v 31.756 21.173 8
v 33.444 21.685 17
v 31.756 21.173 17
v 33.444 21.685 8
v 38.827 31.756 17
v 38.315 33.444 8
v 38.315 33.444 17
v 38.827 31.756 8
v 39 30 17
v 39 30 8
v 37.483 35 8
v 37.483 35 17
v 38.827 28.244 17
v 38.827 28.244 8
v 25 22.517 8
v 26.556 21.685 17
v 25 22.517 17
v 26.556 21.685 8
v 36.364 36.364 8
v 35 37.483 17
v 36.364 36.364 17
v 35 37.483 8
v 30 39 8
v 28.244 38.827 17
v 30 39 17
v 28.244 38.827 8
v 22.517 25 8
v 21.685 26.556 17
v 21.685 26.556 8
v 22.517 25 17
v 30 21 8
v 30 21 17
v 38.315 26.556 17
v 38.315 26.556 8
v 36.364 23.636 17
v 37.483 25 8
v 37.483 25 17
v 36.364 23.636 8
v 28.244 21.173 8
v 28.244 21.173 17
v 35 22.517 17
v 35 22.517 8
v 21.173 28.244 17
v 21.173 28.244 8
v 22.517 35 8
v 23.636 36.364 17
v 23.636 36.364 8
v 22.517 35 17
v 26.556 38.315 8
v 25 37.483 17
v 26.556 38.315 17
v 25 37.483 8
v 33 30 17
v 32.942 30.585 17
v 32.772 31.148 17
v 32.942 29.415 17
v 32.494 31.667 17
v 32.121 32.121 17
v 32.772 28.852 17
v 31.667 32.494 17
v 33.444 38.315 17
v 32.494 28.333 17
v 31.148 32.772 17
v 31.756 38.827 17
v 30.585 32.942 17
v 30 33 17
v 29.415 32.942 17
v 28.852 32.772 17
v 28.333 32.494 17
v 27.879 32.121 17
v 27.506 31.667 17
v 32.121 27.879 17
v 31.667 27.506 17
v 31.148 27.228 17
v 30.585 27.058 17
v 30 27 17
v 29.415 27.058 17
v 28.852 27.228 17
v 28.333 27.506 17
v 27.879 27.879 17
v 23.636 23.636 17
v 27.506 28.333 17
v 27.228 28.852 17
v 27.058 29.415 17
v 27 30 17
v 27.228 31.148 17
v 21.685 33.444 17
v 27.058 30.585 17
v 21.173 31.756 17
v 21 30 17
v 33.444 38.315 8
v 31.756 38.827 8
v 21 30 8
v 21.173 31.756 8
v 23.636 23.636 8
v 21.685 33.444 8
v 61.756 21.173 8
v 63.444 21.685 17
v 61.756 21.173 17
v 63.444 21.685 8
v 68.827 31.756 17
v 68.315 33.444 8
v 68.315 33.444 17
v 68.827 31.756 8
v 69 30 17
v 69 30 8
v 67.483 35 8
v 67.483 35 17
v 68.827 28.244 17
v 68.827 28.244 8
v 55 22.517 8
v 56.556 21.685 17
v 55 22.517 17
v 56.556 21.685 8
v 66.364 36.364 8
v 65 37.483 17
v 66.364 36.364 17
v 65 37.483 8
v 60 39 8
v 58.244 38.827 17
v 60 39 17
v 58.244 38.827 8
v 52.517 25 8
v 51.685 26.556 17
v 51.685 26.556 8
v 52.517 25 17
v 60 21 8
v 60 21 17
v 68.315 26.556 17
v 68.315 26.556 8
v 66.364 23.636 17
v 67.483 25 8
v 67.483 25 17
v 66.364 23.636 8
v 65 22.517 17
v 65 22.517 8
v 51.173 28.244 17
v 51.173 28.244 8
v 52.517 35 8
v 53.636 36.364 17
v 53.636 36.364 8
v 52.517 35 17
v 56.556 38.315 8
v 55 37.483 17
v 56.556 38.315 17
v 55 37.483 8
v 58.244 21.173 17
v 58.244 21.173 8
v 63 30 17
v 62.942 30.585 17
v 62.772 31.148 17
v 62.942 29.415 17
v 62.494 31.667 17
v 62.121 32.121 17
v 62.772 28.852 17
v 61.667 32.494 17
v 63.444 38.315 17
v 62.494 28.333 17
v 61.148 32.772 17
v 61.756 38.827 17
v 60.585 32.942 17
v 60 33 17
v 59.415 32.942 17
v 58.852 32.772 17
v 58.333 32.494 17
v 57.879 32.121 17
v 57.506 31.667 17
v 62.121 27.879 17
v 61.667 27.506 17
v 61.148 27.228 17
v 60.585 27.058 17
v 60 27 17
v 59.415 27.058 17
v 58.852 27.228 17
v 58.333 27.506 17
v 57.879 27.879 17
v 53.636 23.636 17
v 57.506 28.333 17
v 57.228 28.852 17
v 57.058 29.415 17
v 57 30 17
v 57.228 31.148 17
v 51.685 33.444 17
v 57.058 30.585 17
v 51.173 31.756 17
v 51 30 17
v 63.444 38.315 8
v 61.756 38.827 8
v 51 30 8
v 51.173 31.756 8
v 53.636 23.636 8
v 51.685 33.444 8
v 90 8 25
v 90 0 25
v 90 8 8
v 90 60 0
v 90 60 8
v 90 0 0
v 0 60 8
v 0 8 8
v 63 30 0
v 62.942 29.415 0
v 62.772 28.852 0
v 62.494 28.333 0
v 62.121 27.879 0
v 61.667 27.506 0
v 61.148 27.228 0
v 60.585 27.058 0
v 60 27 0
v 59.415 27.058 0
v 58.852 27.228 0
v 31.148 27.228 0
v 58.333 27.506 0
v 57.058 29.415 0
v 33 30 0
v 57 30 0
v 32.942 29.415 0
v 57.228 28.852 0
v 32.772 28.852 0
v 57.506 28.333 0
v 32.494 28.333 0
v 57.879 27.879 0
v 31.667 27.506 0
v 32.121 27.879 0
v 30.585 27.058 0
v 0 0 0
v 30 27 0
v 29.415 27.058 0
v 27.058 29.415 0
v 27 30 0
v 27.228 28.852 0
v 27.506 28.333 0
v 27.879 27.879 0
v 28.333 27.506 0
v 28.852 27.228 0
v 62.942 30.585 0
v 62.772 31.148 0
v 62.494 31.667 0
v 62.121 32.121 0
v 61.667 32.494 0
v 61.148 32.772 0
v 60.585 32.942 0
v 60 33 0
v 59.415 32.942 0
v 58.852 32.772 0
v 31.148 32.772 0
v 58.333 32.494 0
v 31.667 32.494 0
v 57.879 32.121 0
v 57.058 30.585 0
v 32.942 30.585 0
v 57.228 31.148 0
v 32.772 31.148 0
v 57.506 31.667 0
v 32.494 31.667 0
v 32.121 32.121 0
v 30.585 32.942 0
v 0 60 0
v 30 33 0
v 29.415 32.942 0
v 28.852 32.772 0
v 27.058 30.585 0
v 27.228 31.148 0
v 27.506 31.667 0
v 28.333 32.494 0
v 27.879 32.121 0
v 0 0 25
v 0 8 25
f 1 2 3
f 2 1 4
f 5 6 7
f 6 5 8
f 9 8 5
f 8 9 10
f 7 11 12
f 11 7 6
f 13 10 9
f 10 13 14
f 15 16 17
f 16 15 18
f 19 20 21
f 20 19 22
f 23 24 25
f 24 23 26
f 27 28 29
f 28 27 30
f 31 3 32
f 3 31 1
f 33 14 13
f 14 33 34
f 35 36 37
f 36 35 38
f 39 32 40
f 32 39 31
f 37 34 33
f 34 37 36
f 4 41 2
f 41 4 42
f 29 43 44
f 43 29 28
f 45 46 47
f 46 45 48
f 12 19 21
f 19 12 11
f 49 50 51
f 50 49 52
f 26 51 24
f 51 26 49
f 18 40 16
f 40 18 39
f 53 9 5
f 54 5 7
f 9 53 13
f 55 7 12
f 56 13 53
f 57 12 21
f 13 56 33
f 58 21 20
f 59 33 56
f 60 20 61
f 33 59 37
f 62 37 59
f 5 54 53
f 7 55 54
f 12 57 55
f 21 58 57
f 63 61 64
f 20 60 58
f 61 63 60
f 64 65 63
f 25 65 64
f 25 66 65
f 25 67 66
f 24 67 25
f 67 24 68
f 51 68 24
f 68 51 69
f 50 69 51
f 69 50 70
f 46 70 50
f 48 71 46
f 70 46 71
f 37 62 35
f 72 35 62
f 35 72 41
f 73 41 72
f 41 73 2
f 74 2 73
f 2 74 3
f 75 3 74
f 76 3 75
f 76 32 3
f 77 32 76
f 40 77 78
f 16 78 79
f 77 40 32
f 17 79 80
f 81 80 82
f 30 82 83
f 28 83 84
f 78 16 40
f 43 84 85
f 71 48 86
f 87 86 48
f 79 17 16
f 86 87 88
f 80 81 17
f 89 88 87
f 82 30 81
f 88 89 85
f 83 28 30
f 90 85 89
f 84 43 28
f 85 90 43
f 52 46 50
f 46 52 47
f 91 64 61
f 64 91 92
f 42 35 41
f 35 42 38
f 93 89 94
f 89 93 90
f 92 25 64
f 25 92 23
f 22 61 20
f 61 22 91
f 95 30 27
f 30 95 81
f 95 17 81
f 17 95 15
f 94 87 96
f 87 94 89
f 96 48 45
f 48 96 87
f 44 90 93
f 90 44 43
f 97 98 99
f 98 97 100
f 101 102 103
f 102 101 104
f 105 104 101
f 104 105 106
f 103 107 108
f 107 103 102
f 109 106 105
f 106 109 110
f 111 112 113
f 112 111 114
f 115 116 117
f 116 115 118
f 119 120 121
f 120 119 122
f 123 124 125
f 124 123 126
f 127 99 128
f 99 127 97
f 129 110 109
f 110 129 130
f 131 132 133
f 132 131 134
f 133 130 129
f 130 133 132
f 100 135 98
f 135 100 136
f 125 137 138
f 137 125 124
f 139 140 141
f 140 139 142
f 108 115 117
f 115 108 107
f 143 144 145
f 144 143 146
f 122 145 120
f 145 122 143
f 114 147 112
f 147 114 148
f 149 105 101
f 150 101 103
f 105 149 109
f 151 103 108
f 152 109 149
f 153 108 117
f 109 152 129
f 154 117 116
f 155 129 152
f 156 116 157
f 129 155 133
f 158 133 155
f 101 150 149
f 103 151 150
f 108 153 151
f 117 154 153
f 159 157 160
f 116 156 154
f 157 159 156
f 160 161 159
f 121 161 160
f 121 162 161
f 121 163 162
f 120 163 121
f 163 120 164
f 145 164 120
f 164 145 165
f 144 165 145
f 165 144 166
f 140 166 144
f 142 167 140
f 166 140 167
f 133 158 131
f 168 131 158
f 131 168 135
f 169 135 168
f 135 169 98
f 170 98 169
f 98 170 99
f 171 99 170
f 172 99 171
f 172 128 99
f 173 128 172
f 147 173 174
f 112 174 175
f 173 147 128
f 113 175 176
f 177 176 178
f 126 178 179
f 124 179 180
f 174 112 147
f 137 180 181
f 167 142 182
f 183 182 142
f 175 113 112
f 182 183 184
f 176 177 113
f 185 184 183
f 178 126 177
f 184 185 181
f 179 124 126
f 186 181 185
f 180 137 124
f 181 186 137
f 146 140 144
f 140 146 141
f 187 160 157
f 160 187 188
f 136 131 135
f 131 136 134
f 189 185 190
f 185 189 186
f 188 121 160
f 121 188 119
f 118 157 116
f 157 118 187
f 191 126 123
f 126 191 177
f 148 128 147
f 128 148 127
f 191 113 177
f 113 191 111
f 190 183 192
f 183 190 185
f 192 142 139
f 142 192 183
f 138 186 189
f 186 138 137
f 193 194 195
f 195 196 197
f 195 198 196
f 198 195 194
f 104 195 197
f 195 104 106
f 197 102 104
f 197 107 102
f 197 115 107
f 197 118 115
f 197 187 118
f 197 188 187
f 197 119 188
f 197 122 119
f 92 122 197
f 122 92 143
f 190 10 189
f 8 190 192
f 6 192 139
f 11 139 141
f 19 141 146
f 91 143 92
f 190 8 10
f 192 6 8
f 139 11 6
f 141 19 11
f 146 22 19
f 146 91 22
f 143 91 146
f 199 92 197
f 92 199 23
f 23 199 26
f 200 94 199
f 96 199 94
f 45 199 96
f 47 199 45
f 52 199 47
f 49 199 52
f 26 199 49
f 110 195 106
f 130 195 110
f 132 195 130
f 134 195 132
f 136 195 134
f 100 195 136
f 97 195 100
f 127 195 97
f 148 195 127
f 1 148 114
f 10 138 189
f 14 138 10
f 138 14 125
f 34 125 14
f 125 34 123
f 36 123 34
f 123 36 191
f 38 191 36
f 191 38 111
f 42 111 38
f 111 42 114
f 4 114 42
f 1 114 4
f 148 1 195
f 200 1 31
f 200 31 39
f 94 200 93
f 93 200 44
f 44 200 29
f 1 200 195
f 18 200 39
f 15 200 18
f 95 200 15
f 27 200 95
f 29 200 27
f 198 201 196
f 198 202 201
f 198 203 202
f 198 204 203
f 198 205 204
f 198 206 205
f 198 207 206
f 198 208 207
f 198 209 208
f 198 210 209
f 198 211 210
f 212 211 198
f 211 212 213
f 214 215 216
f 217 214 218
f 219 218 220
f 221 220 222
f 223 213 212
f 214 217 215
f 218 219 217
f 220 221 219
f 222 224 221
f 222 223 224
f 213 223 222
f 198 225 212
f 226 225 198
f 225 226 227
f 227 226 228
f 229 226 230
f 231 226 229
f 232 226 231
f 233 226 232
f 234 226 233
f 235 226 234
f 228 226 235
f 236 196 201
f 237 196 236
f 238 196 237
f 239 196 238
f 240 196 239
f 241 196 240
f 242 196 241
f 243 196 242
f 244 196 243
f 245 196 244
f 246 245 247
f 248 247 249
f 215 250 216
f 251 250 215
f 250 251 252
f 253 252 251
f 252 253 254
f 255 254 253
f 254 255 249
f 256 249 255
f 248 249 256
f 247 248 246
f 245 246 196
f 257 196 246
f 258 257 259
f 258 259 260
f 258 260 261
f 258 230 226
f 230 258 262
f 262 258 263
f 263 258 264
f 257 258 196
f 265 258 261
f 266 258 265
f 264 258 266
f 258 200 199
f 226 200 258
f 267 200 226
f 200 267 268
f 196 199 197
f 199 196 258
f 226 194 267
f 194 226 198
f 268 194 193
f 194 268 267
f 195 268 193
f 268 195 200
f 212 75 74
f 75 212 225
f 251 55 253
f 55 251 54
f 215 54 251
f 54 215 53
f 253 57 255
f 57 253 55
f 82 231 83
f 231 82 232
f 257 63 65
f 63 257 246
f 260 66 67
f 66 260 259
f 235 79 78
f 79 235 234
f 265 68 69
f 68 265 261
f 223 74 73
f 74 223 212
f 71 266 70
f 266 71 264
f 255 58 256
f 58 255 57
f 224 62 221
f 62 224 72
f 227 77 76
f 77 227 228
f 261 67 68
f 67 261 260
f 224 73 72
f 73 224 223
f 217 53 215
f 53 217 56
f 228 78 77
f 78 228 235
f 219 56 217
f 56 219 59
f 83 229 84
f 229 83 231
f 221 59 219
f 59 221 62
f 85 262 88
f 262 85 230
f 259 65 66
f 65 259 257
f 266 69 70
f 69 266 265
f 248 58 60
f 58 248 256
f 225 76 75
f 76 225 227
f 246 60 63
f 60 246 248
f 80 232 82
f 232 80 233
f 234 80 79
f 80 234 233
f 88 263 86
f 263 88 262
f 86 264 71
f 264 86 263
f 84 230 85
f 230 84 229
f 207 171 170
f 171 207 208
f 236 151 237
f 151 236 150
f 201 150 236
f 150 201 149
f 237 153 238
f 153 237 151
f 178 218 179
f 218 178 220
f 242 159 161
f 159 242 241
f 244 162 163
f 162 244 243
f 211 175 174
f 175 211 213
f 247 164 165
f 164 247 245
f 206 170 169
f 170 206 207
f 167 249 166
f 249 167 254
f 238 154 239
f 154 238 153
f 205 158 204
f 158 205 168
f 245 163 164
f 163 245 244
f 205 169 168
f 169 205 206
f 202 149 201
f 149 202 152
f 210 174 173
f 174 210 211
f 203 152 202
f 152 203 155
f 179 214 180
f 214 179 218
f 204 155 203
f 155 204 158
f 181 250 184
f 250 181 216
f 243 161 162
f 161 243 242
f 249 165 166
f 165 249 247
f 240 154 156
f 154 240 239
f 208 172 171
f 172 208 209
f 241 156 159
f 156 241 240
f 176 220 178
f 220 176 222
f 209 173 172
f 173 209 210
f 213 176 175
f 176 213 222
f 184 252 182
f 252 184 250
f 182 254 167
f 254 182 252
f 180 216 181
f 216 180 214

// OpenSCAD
$fn = 32;

// ----------------------------------------------------------------------
// Drill jig: fence jig
// ----------------------------------------------------------------------

// --- parameters (mm) ---
plate_l = 90;             // plate length, X
plate_w = 60;             // plate width, Y
plate_t = 8;              // plate thickness
boss_d = 18;              // guide boss diameter
boss_h = 10;              // boss height above the plate
guide_d = 6;              // guide hole diameter
boss_pitch = 30;          // boss pitch
fence_h = 18;             // fence height above the plate
fence_t = 8;              // fence thickness
fit_tol = 0.05;           // tolerance for press fits, mm
free_tol = 0.2;           // tolerance for clearance fits, mm

n_boss = 2;  // guide bosses
boss_x0 = (plate_l - (n_boss - 1) * boss_pitch) / 2;  // first boss X
boss_top = plate_t - 1 + boss_h;  // boss crown height
fence_top = plate_t - 1 + fence_h;  // fence crown height
total_h = max([fence_top, boss_top]);  // overall height

difference() {
  union() {
  cube([plate_l, plate_w, plate_t]);
  for (i = [0 : n_boss - 1])
    translate([boss_x0 + i * boss_pitch, plate_w / 2, plate_t - 1])
      cylinder(h = boss_h, d = boss_d);
  translate([0, 0, plate_t - 1]) cube([plate_l, fence_t, fence_h]);
  }
  for (i = [0 : n_boss - 1])
    translate([boss_x0 + i * boss_pitch, plate_w / 2, -1])
      cylinder(h = plate_t + boss_h, d = guide_d);
}
